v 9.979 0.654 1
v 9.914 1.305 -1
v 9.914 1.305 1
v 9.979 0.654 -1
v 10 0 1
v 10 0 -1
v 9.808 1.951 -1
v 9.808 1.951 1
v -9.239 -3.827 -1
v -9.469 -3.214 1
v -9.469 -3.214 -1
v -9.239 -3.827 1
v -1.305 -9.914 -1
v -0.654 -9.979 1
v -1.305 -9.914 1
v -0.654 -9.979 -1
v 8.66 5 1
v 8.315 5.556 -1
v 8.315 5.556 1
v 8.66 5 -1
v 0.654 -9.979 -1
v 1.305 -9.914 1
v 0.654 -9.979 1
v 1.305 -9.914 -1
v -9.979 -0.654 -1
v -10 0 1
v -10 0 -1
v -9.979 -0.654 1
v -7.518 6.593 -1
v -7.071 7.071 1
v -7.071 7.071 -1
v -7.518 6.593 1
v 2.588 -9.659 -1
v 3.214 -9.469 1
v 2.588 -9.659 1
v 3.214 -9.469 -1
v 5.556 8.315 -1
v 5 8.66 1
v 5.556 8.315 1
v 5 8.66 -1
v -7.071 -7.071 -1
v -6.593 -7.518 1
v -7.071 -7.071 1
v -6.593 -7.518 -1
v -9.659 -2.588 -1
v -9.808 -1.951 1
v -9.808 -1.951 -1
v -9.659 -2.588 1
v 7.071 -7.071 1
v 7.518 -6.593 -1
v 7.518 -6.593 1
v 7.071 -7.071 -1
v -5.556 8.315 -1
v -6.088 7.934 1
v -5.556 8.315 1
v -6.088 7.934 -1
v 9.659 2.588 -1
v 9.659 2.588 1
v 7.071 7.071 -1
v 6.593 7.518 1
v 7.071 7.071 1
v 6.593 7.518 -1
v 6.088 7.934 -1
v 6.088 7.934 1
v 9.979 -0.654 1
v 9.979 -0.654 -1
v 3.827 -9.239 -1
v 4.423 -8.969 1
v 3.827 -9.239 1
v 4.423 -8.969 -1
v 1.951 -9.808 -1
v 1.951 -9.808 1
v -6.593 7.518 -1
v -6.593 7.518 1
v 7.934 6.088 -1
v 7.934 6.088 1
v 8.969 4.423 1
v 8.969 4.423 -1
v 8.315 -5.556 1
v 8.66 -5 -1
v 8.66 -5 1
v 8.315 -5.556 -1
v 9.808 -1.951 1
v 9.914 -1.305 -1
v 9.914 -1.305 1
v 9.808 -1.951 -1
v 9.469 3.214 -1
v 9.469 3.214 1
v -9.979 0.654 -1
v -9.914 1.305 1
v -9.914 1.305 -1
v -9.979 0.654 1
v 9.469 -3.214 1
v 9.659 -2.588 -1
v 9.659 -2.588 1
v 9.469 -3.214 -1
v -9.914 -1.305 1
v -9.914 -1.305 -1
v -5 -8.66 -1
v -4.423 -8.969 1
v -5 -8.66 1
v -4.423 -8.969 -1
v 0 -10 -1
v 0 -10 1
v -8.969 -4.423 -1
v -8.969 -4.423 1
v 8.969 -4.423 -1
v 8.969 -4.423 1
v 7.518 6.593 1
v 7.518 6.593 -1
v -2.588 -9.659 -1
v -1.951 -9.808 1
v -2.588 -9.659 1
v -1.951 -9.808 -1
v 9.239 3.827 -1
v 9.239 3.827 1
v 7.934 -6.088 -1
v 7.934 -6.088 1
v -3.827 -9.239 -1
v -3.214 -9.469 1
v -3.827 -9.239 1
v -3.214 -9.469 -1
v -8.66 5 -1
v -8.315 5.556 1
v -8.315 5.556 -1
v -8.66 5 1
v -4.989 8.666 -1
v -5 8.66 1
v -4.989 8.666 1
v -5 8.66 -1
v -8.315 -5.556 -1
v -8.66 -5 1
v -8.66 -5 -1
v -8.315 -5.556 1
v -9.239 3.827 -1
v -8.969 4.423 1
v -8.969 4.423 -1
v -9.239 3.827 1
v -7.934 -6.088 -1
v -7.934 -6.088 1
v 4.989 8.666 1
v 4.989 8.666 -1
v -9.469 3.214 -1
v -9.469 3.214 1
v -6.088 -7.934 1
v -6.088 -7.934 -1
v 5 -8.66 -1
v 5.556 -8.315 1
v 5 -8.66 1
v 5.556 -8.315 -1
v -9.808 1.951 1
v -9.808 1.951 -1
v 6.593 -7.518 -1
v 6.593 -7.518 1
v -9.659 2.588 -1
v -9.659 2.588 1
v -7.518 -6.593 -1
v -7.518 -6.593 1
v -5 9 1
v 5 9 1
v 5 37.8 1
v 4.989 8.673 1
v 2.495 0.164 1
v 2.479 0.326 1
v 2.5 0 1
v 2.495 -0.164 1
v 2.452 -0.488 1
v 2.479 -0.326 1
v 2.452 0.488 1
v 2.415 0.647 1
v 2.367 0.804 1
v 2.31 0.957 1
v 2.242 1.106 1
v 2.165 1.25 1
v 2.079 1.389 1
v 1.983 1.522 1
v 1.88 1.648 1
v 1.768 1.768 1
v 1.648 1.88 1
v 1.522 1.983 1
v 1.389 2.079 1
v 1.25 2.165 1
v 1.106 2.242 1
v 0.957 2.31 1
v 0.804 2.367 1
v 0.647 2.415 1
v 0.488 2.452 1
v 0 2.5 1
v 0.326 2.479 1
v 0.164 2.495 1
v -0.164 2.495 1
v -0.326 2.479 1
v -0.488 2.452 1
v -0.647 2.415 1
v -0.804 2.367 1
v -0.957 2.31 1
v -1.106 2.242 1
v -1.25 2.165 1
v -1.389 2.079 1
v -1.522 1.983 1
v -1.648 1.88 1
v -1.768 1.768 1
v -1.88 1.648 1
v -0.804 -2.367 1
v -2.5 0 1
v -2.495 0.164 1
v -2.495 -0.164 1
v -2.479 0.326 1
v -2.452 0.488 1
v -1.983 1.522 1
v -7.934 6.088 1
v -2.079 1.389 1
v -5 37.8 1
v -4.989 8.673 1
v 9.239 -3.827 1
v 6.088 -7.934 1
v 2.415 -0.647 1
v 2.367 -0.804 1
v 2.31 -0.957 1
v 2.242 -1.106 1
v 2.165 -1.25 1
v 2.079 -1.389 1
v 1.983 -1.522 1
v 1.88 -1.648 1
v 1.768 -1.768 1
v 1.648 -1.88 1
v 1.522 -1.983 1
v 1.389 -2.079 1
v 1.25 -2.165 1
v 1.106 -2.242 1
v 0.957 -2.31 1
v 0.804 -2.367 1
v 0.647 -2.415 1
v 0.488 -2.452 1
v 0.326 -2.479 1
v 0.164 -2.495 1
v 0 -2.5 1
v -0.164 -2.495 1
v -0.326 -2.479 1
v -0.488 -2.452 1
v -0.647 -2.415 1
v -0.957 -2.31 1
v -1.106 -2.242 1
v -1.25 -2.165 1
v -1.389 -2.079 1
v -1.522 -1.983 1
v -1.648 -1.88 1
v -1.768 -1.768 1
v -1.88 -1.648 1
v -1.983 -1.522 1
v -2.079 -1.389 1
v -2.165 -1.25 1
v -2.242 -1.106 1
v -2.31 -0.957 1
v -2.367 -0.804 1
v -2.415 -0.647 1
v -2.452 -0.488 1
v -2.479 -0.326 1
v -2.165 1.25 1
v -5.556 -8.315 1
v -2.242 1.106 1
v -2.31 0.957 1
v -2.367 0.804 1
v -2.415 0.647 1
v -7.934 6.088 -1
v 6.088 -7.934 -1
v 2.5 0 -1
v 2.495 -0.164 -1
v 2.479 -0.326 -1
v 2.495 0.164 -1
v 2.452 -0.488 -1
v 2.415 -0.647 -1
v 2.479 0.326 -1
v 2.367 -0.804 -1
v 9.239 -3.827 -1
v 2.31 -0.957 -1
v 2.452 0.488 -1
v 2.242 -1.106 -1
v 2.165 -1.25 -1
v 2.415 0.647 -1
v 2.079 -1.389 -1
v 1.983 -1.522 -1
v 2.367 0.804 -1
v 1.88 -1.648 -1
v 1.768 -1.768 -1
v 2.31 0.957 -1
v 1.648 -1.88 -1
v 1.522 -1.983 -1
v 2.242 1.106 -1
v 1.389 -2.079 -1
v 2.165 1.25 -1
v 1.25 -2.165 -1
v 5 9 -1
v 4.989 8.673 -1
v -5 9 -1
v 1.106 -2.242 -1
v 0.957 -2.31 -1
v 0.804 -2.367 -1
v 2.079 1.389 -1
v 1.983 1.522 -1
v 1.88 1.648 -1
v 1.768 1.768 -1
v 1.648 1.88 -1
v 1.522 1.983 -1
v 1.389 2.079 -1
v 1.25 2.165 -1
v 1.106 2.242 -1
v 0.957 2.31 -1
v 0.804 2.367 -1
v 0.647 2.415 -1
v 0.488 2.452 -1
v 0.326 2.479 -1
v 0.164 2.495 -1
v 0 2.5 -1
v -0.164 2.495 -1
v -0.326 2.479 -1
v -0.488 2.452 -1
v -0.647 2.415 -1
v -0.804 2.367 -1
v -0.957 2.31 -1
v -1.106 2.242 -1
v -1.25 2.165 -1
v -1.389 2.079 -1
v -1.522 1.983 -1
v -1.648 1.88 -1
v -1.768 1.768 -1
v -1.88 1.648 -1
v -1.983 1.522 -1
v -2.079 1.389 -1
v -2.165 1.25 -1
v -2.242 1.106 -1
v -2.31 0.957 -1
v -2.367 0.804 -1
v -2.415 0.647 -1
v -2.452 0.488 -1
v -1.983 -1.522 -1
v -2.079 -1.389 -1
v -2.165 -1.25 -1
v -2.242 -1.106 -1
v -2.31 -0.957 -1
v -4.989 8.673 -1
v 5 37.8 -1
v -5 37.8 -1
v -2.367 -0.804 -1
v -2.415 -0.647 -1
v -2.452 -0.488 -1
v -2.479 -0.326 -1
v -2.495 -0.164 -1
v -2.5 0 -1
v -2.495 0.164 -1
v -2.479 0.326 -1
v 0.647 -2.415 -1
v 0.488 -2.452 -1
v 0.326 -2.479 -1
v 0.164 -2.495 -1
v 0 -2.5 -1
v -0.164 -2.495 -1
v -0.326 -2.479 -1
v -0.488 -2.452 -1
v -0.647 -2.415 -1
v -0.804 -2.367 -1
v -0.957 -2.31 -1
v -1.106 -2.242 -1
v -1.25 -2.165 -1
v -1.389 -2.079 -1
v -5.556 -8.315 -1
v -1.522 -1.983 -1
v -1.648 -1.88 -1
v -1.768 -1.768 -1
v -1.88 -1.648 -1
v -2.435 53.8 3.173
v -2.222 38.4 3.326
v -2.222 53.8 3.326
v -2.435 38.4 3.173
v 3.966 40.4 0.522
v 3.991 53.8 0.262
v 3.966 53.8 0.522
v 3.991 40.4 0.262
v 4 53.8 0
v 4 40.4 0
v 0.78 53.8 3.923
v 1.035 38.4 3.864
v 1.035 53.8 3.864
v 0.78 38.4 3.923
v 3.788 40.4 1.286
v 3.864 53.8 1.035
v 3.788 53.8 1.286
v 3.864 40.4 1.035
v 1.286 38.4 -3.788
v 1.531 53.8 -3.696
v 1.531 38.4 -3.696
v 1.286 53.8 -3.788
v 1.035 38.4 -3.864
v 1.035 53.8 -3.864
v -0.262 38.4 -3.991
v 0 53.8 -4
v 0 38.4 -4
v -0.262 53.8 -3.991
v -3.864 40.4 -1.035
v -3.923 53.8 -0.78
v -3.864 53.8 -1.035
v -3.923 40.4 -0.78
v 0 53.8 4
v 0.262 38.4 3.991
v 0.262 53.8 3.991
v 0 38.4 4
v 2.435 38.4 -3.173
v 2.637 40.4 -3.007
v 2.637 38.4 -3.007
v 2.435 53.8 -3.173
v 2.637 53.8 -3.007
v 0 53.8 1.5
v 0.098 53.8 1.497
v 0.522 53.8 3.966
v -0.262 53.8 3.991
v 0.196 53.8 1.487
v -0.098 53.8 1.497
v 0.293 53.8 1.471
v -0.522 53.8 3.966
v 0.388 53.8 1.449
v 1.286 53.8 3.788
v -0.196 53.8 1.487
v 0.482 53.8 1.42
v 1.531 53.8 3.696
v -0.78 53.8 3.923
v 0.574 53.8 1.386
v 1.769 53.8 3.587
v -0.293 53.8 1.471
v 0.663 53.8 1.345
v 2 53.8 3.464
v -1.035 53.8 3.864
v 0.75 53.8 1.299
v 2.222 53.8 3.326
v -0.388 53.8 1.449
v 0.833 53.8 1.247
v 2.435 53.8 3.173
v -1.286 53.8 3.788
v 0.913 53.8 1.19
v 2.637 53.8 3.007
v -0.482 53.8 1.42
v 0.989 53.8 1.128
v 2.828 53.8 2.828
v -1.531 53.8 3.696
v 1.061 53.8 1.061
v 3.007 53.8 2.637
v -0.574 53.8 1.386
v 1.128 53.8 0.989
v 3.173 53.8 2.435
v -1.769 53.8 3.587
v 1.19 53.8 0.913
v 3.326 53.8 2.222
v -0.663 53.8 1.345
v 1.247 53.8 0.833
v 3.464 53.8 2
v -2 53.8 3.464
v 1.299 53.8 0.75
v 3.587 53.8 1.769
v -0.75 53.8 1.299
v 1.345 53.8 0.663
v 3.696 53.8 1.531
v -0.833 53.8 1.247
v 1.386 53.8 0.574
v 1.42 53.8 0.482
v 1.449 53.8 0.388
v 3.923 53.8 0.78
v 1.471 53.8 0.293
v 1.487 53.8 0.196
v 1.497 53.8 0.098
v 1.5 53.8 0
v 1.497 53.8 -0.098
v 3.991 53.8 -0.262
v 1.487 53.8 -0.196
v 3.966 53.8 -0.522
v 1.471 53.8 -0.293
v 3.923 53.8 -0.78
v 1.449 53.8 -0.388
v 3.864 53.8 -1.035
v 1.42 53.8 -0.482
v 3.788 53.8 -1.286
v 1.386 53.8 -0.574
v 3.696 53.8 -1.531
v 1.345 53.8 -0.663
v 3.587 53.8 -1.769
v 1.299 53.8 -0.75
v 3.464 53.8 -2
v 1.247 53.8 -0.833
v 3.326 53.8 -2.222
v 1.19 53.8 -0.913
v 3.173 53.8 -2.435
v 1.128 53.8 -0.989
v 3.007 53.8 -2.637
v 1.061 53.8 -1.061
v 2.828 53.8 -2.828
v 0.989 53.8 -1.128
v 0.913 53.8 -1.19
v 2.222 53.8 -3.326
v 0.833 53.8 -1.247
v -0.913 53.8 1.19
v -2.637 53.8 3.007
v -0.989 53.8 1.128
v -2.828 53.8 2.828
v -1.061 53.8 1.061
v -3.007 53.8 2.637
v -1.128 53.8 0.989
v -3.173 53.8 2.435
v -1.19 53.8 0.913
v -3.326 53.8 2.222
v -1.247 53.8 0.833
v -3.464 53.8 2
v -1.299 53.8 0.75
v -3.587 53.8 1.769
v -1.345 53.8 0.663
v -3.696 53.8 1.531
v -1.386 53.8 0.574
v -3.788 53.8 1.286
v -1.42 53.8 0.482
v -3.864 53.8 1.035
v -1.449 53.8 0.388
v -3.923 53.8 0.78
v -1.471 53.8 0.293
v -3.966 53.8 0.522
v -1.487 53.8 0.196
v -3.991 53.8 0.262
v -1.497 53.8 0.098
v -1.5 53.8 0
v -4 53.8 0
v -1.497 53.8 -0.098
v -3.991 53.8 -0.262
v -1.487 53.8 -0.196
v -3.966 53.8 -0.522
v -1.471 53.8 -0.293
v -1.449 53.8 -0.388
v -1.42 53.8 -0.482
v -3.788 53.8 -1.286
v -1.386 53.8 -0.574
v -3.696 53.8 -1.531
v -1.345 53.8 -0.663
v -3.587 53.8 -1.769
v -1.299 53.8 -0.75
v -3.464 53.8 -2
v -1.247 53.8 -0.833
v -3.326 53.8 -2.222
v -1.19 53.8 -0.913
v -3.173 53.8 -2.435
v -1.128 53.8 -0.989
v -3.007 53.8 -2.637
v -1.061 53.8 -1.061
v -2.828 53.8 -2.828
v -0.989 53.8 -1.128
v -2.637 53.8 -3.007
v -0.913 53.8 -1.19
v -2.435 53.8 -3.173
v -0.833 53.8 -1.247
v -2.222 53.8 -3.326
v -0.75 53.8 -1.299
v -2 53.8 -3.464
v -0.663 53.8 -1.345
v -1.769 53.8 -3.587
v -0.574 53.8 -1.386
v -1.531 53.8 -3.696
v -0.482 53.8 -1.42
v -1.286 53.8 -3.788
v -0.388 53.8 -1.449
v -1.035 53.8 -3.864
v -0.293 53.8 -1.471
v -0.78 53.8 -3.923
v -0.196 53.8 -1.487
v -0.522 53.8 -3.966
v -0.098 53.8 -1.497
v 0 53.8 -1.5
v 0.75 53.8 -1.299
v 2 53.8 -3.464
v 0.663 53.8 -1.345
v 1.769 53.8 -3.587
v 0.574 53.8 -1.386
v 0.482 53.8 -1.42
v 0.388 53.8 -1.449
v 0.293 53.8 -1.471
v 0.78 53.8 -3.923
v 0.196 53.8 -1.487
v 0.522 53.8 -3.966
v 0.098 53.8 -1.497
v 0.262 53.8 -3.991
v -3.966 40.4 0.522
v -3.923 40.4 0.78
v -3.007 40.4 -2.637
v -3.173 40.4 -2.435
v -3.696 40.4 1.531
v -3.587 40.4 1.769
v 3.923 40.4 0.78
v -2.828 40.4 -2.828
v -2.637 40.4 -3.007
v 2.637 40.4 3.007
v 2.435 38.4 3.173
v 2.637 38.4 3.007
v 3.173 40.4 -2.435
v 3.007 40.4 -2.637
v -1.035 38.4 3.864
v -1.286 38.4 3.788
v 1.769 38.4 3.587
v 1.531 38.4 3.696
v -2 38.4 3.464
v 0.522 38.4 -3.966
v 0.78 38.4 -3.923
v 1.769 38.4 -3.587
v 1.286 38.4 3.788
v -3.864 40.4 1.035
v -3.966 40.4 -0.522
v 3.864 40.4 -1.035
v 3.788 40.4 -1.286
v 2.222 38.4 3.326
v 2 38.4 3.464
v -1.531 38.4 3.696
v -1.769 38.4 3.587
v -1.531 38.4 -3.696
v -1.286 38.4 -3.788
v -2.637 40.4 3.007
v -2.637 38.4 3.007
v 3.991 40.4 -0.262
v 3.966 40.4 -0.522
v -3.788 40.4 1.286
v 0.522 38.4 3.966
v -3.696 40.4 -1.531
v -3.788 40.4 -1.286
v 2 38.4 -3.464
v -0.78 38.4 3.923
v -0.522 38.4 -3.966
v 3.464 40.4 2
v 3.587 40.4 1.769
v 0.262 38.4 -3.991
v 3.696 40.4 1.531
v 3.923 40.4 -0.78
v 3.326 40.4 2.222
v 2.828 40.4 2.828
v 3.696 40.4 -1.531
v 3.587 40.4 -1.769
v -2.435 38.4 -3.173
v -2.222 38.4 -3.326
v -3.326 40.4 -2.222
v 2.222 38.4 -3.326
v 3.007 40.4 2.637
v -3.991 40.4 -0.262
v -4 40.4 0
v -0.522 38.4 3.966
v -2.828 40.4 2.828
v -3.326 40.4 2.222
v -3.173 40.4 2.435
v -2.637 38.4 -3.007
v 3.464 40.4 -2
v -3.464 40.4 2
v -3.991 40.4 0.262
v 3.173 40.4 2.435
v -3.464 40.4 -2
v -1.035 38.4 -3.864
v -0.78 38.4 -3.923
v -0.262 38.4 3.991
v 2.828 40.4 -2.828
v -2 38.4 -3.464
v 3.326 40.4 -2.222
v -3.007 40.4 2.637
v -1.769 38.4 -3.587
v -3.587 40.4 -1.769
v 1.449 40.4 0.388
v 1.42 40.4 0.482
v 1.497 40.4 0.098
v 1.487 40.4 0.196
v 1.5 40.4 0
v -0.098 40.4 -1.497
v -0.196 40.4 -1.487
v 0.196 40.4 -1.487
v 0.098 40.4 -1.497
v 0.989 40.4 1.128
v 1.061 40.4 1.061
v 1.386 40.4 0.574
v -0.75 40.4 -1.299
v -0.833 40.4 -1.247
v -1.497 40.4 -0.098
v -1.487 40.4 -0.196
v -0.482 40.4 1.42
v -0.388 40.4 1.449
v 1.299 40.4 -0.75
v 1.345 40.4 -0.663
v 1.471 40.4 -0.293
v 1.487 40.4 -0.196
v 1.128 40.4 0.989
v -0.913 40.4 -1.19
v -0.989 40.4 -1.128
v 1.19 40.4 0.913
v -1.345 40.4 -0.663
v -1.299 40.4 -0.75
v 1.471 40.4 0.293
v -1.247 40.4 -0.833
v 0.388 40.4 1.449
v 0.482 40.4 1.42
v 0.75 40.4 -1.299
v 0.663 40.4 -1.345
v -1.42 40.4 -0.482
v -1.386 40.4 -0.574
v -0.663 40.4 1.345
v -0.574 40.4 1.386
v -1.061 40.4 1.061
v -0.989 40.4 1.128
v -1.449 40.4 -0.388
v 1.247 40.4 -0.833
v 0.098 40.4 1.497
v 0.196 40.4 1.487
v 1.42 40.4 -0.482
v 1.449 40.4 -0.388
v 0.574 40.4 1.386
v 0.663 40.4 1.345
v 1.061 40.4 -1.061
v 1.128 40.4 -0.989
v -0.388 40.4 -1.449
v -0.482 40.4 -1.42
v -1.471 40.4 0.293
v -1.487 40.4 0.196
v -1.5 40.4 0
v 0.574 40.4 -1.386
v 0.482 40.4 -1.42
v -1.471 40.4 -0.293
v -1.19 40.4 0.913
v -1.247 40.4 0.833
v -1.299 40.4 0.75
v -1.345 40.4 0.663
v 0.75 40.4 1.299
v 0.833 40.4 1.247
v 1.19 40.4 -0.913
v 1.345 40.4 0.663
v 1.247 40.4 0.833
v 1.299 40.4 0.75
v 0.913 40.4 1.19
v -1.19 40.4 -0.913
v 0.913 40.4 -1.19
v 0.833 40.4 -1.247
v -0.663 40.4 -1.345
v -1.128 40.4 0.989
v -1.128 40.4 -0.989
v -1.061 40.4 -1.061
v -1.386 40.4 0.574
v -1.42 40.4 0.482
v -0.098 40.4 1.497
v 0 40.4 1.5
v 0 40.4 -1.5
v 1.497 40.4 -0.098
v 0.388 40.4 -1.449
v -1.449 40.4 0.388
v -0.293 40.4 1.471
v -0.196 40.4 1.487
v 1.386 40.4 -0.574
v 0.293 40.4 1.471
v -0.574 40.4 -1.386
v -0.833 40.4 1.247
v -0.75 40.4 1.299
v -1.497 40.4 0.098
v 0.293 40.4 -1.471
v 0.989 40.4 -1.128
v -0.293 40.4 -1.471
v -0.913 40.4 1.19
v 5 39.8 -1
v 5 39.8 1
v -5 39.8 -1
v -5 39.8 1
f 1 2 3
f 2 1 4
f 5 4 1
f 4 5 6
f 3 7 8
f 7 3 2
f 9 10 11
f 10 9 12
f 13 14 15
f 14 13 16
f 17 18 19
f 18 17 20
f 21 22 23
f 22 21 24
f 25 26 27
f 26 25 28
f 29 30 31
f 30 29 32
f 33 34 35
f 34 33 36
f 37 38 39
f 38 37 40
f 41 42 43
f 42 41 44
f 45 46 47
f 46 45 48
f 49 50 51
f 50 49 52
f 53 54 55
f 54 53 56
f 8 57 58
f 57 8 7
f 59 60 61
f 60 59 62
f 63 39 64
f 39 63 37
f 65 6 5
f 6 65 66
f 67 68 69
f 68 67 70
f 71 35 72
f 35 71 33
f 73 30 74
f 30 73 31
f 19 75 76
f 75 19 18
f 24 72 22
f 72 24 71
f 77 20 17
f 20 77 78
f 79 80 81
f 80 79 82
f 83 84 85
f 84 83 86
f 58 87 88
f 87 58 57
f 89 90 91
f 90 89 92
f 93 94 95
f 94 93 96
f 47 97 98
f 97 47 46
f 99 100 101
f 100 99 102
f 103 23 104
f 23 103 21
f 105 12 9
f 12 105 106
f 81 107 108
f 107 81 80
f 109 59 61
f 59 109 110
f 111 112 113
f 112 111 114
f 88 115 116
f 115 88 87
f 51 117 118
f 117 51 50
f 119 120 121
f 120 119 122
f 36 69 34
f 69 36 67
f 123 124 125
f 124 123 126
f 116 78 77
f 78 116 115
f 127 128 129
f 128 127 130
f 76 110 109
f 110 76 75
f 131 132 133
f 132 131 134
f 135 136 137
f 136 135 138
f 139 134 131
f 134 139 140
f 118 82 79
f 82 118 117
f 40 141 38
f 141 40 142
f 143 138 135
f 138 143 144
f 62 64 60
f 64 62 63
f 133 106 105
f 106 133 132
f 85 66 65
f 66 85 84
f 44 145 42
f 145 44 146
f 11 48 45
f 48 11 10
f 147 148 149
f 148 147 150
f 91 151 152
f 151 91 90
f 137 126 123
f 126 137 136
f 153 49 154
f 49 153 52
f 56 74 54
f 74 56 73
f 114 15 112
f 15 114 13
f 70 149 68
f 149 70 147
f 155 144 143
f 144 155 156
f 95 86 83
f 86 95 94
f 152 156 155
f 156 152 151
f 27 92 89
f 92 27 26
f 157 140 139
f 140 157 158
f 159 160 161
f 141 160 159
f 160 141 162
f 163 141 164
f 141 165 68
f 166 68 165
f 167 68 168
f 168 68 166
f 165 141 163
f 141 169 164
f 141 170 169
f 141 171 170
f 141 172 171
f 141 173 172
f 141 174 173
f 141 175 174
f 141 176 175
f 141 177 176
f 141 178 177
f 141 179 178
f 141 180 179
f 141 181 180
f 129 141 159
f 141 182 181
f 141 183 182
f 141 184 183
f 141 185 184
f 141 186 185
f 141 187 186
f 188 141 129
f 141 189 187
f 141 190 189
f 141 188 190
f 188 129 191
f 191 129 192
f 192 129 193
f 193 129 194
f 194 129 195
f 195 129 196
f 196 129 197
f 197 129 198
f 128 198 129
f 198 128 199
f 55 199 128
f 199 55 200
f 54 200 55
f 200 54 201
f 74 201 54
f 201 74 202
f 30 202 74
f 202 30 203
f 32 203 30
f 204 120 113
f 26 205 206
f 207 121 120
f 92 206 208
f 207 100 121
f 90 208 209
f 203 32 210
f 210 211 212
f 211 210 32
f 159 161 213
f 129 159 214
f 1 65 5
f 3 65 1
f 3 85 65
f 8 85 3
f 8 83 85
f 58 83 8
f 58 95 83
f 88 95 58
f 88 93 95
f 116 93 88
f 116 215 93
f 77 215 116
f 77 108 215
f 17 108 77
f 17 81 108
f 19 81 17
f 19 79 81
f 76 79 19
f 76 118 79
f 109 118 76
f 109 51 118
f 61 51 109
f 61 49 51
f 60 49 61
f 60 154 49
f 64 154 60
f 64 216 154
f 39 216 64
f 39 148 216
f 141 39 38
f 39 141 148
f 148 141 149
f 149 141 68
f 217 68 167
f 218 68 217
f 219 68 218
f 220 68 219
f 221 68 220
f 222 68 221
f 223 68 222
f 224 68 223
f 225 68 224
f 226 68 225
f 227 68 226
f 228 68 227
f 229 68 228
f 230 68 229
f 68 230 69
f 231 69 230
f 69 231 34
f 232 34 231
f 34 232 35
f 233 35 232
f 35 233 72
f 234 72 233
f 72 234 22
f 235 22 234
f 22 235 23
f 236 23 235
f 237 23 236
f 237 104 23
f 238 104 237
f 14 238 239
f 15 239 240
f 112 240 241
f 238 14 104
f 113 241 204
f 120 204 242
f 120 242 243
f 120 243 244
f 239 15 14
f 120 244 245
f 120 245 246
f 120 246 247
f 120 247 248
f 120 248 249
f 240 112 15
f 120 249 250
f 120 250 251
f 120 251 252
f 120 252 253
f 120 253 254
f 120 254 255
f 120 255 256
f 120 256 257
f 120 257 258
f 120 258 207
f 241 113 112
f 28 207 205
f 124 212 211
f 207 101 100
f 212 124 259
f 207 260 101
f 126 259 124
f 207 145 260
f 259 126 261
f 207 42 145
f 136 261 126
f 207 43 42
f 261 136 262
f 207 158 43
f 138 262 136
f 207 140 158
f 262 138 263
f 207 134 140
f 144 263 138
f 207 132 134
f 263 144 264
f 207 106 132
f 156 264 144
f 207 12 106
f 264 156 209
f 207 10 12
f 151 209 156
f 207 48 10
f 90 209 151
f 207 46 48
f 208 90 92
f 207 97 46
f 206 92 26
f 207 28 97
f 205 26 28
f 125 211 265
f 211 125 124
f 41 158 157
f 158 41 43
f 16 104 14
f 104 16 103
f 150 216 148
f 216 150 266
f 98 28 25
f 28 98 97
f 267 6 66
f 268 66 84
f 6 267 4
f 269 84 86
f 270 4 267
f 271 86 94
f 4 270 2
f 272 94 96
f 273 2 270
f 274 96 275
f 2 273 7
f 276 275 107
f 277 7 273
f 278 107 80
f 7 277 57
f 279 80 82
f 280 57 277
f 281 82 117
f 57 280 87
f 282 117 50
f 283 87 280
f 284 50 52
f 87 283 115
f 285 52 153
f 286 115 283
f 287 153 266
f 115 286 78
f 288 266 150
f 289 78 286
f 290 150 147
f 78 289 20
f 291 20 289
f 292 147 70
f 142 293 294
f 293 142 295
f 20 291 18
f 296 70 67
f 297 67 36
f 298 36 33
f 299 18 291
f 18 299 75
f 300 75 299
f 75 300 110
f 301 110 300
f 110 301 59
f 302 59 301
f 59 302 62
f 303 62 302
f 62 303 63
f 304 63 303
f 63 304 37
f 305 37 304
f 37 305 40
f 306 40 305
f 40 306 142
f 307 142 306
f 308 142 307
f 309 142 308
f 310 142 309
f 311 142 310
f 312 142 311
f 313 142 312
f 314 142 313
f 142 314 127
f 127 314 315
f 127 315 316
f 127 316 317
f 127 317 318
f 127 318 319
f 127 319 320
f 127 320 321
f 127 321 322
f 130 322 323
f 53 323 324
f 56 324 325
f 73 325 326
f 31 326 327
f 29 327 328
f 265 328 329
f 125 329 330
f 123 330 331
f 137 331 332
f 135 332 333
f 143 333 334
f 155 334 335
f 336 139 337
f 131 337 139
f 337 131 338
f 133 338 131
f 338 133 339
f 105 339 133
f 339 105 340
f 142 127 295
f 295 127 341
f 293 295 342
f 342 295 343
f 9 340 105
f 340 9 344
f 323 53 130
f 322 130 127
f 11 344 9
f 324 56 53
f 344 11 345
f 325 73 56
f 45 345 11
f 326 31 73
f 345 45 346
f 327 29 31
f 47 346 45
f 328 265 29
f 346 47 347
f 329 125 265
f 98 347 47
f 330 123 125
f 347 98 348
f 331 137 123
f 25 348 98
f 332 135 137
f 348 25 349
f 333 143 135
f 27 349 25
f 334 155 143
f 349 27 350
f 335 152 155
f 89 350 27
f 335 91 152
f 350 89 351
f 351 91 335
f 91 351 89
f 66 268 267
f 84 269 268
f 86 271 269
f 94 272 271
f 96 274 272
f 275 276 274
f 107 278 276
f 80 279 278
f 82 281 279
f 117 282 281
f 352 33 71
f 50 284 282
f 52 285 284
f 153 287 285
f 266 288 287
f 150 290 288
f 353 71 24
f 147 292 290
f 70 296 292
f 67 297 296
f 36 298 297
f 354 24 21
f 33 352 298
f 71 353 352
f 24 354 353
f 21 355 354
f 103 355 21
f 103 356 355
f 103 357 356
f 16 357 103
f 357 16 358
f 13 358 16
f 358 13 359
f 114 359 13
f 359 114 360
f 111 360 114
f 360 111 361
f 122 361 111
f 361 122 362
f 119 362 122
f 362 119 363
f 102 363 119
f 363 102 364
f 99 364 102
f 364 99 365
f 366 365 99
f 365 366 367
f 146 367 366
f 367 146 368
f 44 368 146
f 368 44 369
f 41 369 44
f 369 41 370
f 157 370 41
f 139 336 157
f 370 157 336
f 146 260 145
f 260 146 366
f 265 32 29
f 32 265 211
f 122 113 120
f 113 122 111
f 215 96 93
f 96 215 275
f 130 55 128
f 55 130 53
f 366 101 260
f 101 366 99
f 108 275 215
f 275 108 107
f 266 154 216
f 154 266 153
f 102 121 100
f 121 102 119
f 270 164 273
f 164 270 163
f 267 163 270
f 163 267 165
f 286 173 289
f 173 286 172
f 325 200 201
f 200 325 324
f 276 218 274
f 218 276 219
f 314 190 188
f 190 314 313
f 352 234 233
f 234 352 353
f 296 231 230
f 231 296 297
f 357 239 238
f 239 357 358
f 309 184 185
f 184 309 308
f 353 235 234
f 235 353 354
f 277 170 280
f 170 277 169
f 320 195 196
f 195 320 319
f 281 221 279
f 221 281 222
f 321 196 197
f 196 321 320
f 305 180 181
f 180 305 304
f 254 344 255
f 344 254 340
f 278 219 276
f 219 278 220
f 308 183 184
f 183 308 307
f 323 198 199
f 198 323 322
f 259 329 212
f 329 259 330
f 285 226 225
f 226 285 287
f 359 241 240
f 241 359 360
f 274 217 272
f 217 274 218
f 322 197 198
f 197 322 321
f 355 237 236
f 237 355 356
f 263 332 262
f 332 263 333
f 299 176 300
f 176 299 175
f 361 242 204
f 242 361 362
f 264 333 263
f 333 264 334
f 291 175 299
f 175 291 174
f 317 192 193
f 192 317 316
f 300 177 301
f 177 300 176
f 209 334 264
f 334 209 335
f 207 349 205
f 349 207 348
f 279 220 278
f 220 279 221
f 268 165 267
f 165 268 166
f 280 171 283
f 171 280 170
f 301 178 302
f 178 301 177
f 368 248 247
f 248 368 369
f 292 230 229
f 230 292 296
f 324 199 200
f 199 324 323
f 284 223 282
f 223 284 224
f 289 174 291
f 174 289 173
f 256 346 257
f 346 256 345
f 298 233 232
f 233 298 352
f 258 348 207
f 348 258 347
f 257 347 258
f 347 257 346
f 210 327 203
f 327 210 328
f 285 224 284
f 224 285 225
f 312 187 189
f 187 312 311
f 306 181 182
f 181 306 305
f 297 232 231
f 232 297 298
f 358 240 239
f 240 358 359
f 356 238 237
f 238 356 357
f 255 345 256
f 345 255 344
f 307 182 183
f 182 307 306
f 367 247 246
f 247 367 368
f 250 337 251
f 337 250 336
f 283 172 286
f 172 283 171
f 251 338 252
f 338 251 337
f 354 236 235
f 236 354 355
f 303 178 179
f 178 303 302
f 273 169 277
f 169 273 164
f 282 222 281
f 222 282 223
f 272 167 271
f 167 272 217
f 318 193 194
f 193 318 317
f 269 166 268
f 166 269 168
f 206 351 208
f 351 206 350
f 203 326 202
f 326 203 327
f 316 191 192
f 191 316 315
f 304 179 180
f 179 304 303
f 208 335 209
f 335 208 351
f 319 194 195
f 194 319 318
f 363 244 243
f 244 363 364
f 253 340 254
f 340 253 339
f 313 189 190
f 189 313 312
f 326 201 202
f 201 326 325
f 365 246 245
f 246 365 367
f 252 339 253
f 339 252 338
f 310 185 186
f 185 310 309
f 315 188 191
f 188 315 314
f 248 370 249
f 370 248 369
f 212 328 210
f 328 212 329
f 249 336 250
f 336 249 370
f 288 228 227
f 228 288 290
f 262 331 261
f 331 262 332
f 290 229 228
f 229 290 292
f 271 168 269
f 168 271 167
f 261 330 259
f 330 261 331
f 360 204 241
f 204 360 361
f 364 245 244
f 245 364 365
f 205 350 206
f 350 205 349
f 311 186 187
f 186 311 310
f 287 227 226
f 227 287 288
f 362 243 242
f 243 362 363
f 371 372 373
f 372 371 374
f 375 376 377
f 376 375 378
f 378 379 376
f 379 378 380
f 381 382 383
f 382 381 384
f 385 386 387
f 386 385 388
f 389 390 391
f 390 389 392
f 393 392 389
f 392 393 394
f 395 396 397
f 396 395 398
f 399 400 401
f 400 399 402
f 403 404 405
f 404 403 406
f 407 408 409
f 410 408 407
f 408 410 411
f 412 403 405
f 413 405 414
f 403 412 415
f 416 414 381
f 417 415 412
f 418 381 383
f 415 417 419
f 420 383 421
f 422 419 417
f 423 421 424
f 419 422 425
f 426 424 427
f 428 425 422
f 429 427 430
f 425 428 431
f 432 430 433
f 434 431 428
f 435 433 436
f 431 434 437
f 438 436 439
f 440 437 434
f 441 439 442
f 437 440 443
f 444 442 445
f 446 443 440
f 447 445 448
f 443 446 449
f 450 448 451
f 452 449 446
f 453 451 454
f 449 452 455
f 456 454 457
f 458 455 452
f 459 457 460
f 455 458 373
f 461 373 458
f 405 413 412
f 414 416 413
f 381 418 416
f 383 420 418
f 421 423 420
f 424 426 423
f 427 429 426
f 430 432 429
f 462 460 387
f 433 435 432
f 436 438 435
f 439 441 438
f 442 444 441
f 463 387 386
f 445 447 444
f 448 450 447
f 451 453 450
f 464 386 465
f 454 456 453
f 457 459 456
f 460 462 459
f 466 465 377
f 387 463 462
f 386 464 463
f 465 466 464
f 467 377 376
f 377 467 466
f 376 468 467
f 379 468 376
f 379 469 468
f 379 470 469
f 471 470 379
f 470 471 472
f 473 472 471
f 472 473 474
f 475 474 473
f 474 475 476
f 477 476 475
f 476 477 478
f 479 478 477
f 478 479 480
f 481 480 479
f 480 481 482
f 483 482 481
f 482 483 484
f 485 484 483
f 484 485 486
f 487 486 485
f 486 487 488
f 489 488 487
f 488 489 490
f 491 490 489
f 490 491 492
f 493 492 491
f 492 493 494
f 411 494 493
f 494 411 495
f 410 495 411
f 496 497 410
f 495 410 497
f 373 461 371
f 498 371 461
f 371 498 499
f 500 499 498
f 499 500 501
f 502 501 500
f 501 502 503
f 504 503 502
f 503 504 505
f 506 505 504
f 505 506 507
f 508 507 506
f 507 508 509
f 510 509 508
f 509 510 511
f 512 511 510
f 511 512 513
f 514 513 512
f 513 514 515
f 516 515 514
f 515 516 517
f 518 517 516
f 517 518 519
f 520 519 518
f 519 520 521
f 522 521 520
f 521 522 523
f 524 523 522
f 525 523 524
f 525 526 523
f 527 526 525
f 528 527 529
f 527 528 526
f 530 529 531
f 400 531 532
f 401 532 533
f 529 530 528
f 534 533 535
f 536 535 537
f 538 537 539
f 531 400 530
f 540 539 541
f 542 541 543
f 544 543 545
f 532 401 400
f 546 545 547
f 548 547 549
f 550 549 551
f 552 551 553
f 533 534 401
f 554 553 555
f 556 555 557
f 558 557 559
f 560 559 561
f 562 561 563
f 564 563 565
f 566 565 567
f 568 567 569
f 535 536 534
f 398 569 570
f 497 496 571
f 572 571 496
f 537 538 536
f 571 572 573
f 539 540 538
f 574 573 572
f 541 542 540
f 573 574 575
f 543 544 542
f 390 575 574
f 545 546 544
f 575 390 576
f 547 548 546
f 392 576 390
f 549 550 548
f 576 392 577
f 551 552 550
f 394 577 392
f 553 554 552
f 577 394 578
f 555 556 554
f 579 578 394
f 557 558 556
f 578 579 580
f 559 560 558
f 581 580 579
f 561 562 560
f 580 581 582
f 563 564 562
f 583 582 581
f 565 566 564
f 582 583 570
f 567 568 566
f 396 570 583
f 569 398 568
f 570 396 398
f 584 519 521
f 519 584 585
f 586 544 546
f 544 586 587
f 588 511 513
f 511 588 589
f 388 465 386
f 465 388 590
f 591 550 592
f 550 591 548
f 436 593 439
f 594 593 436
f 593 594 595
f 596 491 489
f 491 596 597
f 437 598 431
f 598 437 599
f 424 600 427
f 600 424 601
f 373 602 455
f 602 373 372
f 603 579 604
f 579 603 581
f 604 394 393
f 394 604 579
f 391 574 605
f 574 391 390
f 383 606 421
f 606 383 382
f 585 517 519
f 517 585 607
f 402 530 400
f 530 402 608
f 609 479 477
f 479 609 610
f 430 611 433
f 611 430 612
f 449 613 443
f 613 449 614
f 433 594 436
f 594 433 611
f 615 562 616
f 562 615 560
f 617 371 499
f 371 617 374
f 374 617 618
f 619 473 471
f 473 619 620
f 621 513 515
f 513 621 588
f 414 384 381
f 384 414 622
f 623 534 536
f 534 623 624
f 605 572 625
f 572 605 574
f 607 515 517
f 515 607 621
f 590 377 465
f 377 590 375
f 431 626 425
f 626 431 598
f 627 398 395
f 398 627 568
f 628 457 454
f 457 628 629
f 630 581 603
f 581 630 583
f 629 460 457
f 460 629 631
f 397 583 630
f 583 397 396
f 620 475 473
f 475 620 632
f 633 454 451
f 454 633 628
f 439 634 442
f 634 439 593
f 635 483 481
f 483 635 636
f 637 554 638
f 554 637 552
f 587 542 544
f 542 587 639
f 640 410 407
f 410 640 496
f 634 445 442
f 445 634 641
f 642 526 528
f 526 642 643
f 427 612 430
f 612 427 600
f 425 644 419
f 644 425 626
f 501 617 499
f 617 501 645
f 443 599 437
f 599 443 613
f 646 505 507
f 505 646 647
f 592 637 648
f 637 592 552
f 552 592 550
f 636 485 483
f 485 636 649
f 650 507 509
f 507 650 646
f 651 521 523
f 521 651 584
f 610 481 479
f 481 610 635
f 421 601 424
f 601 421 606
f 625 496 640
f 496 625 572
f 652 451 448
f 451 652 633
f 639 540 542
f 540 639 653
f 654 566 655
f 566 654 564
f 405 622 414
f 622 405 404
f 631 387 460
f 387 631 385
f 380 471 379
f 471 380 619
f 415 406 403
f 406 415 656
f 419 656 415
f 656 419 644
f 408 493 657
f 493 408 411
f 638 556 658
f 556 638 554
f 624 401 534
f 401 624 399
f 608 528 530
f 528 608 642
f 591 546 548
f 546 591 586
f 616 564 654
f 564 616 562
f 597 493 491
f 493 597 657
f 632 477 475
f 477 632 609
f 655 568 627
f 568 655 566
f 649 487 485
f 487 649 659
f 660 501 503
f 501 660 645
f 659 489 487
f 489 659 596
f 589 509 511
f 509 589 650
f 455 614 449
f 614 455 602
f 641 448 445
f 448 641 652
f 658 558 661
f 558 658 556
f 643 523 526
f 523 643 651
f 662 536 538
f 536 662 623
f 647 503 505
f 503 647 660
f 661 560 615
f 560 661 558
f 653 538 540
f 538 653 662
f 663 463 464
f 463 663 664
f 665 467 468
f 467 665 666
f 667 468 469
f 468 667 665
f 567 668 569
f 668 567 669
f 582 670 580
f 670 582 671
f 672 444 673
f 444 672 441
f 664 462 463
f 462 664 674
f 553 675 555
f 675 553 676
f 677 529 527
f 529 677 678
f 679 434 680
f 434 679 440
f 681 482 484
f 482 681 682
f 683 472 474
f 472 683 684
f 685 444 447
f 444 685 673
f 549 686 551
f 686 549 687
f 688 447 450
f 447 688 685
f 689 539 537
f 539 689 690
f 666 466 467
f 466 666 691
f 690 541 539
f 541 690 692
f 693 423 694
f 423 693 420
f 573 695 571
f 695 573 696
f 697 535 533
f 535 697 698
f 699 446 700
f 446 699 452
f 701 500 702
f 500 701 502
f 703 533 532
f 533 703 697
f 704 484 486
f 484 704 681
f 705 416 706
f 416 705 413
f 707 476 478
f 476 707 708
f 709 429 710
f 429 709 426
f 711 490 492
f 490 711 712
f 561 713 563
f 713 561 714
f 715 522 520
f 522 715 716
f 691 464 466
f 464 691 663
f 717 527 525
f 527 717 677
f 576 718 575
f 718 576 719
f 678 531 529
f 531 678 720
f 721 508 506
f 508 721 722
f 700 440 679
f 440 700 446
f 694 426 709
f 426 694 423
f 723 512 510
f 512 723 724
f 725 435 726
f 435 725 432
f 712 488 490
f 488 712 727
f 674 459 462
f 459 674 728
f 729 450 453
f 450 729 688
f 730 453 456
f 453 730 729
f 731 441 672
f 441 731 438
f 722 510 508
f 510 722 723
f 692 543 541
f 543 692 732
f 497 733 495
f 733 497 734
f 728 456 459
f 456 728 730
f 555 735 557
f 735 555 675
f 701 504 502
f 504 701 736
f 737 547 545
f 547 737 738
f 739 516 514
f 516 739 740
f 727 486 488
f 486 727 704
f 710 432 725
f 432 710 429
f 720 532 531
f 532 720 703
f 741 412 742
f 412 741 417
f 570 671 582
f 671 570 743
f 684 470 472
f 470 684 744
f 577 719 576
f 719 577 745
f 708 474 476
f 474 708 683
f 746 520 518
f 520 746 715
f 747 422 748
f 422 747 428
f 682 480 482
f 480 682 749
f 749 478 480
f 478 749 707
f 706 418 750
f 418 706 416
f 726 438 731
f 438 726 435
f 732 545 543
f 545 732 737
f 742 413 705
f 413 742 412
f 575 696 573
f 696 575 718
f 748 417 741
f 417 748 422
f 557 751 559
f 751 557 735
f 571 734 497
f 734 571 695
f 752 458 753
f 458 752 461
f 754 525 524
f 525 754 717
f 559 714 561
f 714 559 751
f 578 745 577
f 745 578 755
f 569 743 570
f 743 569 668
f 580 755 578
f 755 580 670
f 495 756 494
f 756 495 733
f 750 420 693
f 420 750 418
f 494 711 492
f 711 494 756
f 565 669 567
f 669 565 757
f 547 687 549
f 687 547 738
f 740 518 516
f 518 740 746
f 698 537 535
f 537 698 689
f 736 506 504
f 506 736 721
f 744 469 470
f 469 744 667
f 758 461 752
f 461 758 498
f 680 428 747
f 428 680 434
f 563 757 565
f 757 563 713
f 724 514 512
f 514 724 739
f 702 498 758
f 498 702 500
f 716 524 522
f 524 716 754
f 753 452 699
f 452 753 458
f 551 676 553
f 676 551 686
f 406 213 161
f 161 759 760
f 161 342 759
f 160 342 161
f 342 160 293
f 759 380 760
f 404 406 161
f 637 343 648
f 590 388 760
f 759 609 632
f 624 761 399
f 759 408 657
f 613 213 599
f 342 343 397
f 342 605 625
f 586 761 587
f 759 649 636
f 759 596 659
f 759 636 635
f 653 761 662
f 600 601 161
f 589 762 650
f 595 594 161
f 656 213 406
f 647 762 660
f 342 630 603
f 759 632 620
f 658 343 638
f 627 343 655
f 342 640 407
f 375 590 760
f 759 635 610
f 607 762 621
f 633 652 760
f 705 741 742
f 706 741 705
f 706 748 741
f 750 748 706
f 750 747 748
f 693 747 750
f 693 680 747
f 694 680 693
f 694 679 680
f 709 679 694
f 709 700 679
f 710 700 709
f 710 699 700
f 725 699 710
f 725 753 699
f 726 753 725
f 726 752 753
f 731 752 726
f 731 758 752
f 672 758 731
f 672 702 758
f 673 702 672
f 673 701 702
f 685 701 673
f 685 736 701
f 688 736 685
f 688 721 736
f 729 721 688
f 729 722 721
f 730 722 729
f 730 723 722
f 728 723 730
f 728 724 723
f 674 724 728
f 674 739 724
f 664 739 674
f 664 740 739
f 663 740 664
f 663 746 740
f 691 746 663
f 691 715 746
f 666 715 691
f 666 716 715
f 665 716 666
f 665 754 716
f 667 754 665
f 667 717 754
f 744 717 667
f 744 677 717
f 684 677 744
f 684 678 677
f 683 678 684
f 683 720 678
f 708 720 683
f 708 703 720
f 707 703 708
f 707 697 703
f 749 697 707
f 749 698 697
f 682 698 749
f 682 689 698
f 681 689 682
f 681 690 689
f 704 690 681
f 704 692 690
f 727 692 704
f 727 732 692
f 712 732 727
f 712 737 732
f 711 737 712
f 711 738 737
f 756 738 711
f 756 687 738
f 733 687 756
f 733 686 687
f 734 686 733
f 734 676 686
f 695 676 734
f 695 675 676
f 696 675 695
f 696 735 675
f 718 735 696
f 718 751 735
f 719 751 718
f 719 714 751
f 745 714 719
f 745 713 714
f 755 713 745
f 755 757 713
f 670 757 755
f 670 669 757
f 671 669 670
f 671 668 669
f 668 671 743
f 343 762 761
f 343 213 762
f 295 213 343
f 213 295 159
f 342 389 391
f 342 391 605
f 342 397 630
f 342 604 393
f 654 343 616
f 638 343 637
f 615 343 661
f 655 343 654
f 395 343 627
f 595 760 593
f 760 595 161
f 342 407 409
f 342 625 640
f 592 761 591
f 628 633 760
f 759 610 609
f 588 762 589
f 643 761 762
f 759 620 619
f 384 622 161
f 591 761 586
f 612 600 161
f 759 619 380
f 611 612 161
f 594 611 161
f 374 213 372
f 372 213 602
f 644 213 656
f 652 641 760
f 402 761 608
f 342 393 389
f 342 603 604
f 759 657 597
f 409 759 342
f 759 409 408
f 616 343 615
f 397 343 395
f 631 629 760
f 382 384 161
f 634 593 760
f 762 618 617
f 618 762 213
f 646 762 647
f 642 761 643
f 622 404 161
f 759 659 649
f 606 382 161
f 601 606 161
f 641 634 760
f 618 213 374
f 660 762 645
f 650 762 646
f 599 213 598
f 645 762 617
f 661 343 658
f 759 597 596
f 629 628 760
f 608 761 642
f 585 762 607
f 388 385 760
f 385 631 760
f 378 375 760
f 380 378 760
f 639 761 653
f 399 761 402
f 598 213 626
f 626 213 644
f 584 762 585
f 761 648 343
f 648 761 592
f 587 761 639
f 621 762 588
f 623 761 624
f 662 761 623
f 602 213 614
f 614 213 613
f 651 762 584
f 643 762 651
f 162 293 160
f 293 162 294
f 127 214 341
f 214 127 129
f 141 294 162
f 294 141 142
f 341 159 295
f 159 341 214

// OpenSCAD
$fn = 96;

// Parameters
ring_diameter = 20;
ring_thickness = 2;
bolt_hole_diameter = 5;

tongue_length = 30;
tongue_width = 10;
tongue_thickness = 2;

crimp_barrel_diameter = 8;
crimp_barrel_length = 15;

bend_angle = 30;          // only used if include_bend=true and include_crimp=false
wire_hole_diameter = 3;   // only used if include_crimp=true

include_crimp = true;
include_bend  = false;

// Small overlap to guarantee watertight unions
overlap = 0.6;

// Derived
ring_r = ring_diameter/2;
bolt_r = bolt_hole_diameter/2;

// Place ring center at origin; tongue extends in +Y
// Make tongue start at ring outer edge (tangent) with a slight overlap
tongue_y0 = ring_r - overlap;                 // tongue start (near ring)
tongue_y1 = tongue_y0 + tongue_length;        // tongue end

// Crimp barrel center so it touches tongue end with overlap
barrel_cy = tongue_y1 + crimp_barrel_length/2 - overlap;

// Ring (eyelet) with central hole
module ring_eyelet() {
    difference() {
        cylinder(d=ring_diameter, h=ring_thickness, center=true);
        cylinder(d=bolt_hole_diameter, h=ring_thickness + 2, center=true);
    }
}

// Flat tongue (shank)
module tongue() {
    translate([0, (tongue_y0 + tongue_y1)/2, 0])
        cube([tongue_width, tongue_length, tongue_thickness], center=true);
}

// Smooth transition between ring and tongue (integrated, not floating)
module ring_to_tongue_transition() {
    hull() {
        // small pad at tongue start
        translate([0, tongue_y0 + tongue_thickness/2, 0])
            cube([tongue_width, tongue_thickness, tongue_thickness], center=true);

        // small pad on ring edge (toward +Y)
        translate([0, ring_r - tongue_thickness/2, 0])
            cylinder(d=tongue_width, h=ring_thickness, center=true);
    }
}

// Crimp barrel (tube) aligned with tongue, connected with overlap
module crimp_barrel() {
    // Outer barrel
    difference() {
        translate([0, barrel_cy, 0])
            rotate([90, 0, 0])  // axis along Y
                cylinder(d=crimp_barrel_diameter, h=crimp_barrel_length, center=true);

        // Inner wire passage (hollow tube)
        translate([0, barrel_cy, 0])
            rotate([90, 0, 0])
                cylinder(d=wire_hole_diameter, h=crimp_barrel_length + 2, center=true);
    }
}

// Optional bent tongue variant (kept connected by using same start point)
module bent_tongue_variant() {
    // A simple bent extension after the flat tongue end
    bend_len = tongue_length/2;
    translate([0, tongue_y1 - overlap, 0])
        rotate([bend_angle, 0, 0])
            translate([0, bend_len/2, 0])
                cube([tongue_width, bend_len, tongue_thickness], center=true);
}

// Assembly: one connected solid
module ring_terminal() {
    union() {
        ring_eyelet();
        tongue();
        ring_to_tongue_transition();

        if (include_crimp) {
            // Connect barrel to tongue with a small hull "collar"
            hull() {
                // pad at tongue end
                translate([0, tongue_y1 - overlap, 0])
                    cube([tongue_width, tongue_thickness, tongue_thickness], center=true);

                // pad at barrel near end (toward tongue)
                translate([0, barrel_cy - crimp_barrel_length/2 + overlap, 0])
                    rotate([90, 0, 0])
                        cylinder(d=crimp_barrel_diameter, h=tongue_thickness, center=true);
            }
            crimp_barrel();
        } else if (include_bend) {
            bent_tongue_variant();
        }
    }
}

ring_terminal();
